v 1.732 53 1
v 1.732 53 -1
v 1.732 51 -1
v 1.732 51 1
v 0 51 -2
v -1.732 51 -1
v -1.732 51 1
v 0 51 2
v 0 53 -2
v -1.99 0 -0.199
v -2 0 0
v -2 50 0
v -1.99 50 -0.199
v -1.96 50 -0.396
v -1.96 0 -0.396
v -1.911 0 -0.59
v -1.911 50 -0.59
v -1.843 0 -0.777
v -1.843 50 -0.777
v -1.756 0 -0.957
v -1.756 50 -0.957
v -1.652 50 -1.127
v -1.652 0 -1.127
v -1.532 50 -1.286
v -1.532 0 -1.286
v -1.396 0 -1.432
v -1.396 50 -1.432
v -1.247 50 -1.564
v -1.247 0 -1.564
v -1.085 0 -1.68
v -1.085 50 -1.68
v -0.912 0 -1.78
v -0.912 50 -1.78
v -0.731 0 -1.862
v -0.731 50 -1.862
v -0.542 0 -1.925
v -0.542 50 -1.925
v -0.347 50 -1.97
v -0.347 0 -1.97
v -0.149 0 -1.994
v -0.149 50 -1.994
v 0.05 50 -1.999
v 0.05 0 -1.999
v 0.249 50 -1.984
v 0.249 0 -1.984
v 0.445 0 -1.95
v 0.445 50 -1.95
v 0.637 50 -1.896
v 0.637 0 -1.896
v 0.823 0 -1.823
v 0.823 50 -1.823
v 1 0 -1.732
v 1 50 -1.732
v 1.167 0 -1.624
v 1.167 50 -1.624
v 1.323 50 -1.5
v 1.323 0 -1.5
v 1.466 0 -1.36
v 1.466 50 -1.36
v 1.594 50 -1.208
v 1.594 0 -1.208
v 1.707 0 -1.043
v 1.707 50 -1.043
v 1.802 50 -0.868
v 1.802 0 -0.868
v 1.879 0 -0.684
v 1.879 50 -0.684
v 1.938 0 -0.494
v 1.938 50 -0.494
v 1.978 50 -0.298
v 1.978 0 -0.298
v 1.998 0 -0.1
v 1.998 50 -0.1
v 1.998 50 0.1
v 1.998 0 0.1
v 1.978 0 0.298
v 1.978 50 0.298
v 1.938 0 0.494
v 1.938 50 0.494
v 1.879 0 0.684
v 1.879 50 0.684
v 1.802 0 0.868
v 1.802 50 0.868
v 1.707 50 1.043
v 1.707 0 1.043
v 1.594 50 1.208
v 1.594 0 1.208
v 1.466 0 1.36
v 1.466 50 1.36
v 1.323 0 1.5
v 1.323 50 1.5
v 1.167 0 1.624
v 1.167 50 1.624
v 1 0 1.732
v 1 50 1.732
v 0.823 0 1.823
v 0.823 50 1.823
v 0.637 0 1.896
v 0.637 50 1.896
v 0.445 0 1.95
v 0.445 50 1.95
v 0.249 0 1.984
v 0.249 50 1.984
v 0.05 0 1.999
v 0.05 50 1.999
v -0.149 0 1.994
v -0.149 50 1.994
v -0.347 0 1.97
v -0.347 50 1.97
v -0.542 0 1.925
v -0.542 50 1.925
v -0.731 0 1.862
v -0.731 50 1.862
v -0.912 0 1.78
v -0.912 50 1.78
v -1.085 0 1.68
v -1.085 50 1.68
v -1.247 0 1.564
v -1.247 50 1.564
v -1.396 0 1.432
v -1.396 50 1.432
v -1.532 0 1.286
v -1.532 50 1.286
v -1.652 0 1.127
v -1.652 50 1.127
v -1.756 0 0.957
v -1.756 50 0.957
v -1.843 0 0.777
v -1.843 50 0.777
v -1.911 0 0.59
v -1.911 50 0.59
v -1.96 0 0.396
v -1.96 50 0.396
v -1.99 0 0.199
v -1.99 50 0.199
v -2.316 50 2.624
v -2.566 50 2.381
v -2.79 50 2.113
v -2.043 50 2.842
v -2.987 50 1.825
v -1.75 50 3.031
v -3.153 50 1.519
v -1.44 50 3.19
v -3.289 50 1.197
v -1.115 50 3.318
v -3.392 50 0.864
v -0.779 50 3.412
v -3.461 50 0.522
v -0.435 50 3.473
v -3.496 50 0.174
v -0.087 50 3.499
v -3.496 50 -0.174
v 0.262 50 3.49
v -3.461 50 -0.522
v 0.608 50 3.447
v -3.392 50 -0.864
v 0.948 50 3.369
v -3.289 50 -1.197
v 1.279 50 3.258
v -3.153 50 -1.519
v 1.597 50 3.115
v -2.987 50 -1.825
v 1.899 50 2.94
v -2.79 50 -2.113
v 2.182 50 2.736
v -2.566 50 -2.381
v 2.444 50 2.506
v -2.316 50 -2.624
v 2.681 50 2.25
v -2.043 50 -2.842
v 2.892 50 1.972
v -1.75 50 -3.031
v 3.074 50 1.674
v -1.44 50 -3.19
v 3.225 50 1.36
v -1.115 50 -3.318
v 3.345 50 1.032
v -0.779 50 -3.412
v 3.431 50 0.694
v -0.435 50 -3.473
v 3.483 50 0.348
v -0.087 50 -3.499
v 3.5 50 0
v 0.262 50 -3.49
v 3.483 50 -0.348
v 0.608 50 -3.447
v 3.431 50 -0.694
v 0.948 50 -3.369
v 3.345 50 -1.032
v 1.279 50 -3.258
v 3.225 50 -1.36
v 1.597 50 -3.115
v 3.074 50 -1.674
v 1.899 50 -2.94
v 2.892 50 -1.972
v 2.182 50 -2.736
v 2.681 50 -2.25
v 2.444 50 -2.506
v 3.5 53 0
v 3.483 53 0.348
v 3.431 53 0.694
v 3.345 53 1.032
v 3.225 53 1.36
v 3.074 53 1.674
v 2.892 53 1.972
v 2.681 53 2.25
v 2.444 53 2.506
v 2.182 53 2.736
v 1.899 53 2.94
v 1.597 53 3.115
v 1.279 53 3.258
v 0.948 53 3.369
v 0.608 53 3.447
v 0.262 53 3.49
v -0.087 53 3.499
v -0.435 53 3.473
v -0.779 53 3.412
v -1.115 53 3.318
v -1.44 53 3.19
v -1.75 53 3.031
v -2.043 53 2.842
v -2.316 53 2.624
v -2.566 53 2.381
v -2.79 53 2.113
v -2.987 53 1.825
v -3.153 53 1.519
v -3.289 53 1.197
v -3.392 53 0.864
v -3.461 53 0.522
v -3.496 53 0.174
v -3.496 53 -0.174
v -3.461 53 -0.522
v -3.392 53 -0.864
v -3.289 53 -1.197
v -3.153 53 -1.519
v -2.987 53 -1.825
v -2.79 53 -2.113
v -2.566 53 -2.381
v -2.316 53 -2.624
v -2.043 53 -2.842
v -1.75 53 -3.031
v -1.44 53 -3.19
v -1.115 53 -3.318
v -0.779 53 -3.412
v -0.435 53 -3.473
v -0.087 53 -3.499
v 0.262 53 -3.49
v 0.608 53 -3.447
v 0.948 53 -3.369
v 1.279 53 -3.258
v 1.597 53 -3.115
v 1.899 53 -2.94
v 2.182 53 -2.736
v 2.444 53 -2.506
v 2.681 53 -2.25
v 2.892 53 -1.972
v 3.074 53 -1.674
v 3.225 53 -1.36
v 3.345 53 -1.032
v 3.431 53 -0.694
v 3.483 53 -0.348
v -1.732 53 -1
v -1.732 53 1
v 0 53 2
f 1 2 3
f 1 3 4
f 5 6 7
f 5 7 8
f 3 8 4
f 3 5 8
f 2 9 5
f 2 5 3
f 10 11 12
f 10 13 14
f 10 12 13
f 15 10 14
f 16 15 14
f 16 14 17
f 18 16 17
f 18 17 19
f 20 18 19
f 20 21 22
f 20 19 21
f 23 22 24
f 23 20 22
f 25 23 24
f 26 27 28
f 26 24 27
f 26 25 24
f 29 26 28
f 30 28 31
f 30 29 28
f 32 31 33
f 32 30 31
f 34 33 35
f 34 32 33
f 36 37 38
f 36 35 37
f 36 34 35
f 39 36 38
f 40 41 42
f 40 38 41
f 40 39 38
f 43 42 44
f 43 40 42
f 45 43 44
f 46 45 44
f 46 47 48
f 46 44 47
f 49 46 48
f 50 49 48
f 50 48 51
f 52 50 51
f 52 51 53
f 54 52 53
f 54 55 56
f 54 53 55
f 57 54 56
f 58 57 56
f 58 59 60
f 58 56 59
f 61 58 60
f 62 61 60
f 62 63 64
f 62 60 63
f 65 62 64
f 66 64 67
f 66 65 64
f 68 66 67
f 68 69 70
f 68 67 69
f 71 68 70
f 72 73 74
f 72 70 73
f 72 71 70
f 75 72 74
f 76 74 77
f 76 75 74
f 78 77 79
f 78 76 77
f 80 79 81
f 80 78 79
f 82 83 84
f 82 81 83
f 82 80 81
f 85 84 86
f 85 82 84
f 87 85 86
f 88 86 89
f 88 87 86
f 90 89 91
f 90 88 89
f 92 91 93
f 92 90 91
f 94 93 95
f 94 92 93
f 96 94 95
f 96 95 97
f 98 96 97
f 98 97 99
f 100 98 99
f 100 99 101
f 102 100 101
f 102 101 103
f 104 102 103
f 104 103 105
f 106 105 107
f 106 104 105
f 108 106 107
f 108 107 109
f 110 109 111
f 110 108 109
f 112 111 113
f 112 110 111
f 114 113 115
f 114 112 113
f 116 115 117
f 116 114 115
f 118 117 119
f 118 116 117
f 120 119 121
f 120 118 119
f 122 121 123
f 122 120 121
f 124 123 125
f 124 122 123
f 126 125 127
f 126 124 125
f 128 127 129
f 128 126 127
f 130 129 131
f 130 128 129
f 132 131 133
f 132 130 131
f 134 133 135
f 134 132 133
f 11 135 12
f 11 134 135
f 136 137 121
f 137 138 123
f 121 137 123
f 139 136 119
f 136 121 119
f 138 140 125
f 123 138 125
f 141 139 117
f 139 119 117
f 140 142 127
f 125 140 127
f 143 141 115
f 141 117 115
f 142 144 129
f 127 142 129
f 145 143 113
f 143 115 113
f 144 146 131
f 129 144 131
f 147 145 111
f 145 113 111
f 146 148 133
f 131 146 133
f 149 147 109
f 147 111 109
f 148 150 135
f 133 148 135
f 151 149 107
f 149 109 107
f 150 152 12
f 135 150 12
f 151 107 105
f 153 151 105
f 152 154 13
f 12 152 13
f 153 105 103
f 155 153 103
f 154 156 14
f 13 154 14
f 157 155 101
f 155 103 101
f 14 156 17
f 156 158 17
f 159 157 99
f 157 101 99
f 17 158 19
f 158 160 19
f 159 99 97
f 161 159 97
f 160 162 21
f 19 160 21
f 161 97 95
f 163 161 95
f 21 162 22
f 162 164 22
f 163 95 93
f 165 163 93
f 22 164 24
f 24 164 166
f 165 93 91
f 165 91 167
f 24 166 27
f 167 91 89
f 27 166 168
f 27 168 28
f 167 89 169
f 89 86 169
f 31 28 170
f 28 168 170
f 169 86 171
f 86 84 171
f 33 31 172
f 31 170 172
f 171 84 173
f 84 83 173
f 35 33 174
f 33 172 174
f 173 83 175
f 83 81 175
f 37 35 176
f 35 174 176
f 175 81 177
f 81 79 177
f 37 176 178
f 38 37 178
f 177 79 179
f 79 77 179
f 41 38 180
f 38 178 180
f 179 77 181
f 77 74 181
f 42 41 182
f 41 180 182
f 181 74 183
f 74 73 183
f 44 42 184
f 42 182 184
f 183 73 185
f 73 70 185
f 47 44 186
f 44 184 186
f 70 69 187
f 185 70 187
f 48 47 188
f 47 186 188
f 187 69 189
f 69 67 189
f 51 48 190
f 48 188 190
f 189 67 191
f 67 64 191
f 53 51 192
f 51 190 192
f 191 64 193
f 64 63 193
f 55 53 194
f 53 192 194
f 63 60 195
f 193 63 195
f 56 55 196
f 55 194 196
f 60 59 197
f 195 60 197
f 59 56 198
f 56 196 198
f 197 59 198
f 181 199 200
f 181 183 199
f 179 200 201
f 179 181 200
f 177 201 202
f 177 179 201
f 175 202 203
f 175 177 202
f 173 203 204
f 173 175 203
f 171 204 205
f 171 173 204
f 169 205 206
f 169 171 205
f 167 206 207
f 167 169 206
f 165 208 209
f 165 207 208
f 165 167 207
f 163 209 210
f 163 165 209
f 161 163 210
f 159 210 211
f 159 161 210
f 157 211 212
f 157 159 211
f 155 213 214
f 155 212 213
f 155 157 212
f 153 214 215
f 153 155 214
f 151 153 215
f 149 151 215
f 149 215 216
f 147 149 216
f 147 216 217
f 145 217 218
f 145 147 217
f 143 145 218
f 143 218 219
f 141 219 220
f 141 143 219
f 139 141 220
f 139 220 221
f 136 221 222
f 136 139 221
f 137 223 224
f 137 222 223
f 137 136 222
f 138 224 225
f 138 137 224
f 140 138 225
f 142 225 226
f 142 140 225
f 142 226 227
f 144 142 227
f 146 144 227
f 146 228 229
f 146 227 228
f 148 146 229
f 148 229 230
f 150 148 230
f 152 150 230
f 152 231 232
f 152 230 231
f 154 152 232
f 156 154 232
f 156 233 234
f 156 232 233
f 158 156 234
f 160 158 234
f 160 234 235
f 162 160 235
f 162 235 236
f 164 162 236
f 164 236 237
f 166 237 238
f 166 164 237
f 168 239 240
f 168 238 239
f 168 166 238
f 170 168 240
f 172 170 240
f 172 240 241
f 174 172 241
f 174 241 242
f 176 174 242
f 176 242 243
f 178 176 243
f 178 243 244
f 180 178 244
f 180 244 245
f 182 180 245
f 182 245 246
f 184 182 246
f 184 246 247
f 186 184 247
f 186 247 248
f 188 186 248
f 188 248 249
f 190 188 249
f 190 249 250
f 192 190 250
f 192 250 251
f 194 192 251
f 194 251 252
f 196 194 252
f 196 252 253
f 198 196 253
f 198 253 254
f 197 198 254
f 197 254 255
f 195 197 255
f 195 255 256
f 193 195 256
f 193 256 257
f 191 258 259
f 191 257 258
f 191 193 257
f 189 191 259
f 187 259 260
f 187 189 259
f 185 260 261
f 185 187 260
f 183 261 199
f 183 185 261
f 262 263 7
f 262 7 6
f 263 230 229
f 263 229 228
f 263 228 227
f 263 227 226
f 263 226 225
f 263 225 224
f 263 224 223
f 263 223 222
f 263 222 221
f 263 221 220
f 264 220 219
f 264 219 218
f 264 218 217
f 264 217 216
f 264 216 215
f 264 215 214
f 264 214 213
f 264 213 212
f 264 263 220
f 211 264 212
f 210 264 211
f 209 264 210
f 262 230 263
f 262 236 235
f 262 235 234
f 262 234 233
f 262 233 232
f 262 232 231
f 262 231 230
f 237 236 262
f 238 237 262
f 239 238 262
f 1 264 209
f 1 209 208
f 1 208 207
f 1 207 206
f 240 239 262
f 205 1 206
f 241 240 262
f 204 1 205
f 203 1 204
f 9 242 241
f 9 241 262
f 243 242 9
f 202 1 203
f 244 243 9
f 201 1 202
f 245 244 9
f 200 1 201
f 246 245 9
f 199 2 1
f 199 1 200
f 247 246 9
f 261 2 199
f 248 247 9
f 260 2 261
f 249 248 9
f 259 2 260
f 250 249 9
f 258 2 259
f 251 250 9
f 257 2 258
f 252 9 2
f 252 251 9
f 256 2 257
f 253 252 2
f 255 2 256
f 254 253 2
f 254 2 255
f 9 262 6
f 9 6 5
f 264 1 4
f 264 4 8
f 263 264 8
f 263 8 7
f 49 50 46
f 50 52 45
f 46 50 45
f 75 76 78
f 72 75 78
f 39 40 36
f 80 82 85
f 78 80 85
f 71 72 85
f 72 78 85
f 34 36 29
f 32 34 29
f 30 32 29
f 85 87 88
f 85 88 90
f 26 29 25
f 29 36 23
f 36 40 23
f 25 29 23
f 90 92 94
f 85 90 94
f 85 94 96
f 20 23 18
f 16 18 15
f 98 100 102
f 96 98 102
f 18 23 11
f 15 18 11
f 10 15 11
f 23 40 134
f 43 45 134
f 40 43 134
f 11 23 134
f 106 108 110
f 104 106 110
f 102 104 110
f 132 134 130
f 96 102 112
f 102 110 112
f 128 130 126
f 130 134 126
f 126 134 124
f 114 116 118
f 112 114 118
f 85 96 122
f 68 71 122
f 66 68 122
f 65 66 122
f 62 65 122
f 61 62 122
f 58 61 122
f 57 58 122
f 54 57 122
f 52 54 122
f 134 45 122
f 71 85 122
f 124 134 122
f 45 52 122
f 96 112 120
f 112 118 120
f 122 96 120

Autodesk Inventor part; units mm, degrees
ref_plane "YZ Plane" through (0, 0, 0) normal (1, 0, 0) x (0, 1, 0)
ref_plane "XZ Plane" through (0, 0, 0) normal (0, 1, 0) x (-1, 0, 0)
ref_plane "XY Plane" through (0, 0, 0) normal (0, 0, 1) x (1, 0, 0)
sketch "Sketch1" plane through (0, 0, 0) normal (0, 1, 0) x (-1, 0, 0)
  circle A0 centre (0, 0) radius 2
  dimension "d0" = 4
extrude "Extrusion1" add sketch "Sketch1" along normal blind 50
sketch "Sketch2" plane through (0, 50, 0) normal (0, 1, 0) x (1, 0, 0)
  circle A0 centre (0, 0) radius 3.5
  dimension "d3" = 7
extrude "Extrusion2" add sketch "Sketch2" along normal blind 3
sketch "Sketch3" plane through (0, 53, 0) normal (0, 1, 0) x (1, 0, 0)
  circle A0 centre (0, 0) radius 2 projected
  line L0 (0, 2) -> (1.7321, 1)
  line L1 (1.7321, 1) -> (1.7321, -1)
  line L2 (1.7321, -1) -> (0, -2)
  line L3 (0, -2) -> (-1.7321, -1)
  line L4 (-1.7321, -1) -> (-1.7321, 1)
  line L5 (-1.7321, 1) -> (0, 2)
extrude "Extrusion3" cut sketch "Sketch3" against normal blind 2 contours L1 L2 L3 L4 L5 L0
properties part number "M4_shoulder_bolt"
